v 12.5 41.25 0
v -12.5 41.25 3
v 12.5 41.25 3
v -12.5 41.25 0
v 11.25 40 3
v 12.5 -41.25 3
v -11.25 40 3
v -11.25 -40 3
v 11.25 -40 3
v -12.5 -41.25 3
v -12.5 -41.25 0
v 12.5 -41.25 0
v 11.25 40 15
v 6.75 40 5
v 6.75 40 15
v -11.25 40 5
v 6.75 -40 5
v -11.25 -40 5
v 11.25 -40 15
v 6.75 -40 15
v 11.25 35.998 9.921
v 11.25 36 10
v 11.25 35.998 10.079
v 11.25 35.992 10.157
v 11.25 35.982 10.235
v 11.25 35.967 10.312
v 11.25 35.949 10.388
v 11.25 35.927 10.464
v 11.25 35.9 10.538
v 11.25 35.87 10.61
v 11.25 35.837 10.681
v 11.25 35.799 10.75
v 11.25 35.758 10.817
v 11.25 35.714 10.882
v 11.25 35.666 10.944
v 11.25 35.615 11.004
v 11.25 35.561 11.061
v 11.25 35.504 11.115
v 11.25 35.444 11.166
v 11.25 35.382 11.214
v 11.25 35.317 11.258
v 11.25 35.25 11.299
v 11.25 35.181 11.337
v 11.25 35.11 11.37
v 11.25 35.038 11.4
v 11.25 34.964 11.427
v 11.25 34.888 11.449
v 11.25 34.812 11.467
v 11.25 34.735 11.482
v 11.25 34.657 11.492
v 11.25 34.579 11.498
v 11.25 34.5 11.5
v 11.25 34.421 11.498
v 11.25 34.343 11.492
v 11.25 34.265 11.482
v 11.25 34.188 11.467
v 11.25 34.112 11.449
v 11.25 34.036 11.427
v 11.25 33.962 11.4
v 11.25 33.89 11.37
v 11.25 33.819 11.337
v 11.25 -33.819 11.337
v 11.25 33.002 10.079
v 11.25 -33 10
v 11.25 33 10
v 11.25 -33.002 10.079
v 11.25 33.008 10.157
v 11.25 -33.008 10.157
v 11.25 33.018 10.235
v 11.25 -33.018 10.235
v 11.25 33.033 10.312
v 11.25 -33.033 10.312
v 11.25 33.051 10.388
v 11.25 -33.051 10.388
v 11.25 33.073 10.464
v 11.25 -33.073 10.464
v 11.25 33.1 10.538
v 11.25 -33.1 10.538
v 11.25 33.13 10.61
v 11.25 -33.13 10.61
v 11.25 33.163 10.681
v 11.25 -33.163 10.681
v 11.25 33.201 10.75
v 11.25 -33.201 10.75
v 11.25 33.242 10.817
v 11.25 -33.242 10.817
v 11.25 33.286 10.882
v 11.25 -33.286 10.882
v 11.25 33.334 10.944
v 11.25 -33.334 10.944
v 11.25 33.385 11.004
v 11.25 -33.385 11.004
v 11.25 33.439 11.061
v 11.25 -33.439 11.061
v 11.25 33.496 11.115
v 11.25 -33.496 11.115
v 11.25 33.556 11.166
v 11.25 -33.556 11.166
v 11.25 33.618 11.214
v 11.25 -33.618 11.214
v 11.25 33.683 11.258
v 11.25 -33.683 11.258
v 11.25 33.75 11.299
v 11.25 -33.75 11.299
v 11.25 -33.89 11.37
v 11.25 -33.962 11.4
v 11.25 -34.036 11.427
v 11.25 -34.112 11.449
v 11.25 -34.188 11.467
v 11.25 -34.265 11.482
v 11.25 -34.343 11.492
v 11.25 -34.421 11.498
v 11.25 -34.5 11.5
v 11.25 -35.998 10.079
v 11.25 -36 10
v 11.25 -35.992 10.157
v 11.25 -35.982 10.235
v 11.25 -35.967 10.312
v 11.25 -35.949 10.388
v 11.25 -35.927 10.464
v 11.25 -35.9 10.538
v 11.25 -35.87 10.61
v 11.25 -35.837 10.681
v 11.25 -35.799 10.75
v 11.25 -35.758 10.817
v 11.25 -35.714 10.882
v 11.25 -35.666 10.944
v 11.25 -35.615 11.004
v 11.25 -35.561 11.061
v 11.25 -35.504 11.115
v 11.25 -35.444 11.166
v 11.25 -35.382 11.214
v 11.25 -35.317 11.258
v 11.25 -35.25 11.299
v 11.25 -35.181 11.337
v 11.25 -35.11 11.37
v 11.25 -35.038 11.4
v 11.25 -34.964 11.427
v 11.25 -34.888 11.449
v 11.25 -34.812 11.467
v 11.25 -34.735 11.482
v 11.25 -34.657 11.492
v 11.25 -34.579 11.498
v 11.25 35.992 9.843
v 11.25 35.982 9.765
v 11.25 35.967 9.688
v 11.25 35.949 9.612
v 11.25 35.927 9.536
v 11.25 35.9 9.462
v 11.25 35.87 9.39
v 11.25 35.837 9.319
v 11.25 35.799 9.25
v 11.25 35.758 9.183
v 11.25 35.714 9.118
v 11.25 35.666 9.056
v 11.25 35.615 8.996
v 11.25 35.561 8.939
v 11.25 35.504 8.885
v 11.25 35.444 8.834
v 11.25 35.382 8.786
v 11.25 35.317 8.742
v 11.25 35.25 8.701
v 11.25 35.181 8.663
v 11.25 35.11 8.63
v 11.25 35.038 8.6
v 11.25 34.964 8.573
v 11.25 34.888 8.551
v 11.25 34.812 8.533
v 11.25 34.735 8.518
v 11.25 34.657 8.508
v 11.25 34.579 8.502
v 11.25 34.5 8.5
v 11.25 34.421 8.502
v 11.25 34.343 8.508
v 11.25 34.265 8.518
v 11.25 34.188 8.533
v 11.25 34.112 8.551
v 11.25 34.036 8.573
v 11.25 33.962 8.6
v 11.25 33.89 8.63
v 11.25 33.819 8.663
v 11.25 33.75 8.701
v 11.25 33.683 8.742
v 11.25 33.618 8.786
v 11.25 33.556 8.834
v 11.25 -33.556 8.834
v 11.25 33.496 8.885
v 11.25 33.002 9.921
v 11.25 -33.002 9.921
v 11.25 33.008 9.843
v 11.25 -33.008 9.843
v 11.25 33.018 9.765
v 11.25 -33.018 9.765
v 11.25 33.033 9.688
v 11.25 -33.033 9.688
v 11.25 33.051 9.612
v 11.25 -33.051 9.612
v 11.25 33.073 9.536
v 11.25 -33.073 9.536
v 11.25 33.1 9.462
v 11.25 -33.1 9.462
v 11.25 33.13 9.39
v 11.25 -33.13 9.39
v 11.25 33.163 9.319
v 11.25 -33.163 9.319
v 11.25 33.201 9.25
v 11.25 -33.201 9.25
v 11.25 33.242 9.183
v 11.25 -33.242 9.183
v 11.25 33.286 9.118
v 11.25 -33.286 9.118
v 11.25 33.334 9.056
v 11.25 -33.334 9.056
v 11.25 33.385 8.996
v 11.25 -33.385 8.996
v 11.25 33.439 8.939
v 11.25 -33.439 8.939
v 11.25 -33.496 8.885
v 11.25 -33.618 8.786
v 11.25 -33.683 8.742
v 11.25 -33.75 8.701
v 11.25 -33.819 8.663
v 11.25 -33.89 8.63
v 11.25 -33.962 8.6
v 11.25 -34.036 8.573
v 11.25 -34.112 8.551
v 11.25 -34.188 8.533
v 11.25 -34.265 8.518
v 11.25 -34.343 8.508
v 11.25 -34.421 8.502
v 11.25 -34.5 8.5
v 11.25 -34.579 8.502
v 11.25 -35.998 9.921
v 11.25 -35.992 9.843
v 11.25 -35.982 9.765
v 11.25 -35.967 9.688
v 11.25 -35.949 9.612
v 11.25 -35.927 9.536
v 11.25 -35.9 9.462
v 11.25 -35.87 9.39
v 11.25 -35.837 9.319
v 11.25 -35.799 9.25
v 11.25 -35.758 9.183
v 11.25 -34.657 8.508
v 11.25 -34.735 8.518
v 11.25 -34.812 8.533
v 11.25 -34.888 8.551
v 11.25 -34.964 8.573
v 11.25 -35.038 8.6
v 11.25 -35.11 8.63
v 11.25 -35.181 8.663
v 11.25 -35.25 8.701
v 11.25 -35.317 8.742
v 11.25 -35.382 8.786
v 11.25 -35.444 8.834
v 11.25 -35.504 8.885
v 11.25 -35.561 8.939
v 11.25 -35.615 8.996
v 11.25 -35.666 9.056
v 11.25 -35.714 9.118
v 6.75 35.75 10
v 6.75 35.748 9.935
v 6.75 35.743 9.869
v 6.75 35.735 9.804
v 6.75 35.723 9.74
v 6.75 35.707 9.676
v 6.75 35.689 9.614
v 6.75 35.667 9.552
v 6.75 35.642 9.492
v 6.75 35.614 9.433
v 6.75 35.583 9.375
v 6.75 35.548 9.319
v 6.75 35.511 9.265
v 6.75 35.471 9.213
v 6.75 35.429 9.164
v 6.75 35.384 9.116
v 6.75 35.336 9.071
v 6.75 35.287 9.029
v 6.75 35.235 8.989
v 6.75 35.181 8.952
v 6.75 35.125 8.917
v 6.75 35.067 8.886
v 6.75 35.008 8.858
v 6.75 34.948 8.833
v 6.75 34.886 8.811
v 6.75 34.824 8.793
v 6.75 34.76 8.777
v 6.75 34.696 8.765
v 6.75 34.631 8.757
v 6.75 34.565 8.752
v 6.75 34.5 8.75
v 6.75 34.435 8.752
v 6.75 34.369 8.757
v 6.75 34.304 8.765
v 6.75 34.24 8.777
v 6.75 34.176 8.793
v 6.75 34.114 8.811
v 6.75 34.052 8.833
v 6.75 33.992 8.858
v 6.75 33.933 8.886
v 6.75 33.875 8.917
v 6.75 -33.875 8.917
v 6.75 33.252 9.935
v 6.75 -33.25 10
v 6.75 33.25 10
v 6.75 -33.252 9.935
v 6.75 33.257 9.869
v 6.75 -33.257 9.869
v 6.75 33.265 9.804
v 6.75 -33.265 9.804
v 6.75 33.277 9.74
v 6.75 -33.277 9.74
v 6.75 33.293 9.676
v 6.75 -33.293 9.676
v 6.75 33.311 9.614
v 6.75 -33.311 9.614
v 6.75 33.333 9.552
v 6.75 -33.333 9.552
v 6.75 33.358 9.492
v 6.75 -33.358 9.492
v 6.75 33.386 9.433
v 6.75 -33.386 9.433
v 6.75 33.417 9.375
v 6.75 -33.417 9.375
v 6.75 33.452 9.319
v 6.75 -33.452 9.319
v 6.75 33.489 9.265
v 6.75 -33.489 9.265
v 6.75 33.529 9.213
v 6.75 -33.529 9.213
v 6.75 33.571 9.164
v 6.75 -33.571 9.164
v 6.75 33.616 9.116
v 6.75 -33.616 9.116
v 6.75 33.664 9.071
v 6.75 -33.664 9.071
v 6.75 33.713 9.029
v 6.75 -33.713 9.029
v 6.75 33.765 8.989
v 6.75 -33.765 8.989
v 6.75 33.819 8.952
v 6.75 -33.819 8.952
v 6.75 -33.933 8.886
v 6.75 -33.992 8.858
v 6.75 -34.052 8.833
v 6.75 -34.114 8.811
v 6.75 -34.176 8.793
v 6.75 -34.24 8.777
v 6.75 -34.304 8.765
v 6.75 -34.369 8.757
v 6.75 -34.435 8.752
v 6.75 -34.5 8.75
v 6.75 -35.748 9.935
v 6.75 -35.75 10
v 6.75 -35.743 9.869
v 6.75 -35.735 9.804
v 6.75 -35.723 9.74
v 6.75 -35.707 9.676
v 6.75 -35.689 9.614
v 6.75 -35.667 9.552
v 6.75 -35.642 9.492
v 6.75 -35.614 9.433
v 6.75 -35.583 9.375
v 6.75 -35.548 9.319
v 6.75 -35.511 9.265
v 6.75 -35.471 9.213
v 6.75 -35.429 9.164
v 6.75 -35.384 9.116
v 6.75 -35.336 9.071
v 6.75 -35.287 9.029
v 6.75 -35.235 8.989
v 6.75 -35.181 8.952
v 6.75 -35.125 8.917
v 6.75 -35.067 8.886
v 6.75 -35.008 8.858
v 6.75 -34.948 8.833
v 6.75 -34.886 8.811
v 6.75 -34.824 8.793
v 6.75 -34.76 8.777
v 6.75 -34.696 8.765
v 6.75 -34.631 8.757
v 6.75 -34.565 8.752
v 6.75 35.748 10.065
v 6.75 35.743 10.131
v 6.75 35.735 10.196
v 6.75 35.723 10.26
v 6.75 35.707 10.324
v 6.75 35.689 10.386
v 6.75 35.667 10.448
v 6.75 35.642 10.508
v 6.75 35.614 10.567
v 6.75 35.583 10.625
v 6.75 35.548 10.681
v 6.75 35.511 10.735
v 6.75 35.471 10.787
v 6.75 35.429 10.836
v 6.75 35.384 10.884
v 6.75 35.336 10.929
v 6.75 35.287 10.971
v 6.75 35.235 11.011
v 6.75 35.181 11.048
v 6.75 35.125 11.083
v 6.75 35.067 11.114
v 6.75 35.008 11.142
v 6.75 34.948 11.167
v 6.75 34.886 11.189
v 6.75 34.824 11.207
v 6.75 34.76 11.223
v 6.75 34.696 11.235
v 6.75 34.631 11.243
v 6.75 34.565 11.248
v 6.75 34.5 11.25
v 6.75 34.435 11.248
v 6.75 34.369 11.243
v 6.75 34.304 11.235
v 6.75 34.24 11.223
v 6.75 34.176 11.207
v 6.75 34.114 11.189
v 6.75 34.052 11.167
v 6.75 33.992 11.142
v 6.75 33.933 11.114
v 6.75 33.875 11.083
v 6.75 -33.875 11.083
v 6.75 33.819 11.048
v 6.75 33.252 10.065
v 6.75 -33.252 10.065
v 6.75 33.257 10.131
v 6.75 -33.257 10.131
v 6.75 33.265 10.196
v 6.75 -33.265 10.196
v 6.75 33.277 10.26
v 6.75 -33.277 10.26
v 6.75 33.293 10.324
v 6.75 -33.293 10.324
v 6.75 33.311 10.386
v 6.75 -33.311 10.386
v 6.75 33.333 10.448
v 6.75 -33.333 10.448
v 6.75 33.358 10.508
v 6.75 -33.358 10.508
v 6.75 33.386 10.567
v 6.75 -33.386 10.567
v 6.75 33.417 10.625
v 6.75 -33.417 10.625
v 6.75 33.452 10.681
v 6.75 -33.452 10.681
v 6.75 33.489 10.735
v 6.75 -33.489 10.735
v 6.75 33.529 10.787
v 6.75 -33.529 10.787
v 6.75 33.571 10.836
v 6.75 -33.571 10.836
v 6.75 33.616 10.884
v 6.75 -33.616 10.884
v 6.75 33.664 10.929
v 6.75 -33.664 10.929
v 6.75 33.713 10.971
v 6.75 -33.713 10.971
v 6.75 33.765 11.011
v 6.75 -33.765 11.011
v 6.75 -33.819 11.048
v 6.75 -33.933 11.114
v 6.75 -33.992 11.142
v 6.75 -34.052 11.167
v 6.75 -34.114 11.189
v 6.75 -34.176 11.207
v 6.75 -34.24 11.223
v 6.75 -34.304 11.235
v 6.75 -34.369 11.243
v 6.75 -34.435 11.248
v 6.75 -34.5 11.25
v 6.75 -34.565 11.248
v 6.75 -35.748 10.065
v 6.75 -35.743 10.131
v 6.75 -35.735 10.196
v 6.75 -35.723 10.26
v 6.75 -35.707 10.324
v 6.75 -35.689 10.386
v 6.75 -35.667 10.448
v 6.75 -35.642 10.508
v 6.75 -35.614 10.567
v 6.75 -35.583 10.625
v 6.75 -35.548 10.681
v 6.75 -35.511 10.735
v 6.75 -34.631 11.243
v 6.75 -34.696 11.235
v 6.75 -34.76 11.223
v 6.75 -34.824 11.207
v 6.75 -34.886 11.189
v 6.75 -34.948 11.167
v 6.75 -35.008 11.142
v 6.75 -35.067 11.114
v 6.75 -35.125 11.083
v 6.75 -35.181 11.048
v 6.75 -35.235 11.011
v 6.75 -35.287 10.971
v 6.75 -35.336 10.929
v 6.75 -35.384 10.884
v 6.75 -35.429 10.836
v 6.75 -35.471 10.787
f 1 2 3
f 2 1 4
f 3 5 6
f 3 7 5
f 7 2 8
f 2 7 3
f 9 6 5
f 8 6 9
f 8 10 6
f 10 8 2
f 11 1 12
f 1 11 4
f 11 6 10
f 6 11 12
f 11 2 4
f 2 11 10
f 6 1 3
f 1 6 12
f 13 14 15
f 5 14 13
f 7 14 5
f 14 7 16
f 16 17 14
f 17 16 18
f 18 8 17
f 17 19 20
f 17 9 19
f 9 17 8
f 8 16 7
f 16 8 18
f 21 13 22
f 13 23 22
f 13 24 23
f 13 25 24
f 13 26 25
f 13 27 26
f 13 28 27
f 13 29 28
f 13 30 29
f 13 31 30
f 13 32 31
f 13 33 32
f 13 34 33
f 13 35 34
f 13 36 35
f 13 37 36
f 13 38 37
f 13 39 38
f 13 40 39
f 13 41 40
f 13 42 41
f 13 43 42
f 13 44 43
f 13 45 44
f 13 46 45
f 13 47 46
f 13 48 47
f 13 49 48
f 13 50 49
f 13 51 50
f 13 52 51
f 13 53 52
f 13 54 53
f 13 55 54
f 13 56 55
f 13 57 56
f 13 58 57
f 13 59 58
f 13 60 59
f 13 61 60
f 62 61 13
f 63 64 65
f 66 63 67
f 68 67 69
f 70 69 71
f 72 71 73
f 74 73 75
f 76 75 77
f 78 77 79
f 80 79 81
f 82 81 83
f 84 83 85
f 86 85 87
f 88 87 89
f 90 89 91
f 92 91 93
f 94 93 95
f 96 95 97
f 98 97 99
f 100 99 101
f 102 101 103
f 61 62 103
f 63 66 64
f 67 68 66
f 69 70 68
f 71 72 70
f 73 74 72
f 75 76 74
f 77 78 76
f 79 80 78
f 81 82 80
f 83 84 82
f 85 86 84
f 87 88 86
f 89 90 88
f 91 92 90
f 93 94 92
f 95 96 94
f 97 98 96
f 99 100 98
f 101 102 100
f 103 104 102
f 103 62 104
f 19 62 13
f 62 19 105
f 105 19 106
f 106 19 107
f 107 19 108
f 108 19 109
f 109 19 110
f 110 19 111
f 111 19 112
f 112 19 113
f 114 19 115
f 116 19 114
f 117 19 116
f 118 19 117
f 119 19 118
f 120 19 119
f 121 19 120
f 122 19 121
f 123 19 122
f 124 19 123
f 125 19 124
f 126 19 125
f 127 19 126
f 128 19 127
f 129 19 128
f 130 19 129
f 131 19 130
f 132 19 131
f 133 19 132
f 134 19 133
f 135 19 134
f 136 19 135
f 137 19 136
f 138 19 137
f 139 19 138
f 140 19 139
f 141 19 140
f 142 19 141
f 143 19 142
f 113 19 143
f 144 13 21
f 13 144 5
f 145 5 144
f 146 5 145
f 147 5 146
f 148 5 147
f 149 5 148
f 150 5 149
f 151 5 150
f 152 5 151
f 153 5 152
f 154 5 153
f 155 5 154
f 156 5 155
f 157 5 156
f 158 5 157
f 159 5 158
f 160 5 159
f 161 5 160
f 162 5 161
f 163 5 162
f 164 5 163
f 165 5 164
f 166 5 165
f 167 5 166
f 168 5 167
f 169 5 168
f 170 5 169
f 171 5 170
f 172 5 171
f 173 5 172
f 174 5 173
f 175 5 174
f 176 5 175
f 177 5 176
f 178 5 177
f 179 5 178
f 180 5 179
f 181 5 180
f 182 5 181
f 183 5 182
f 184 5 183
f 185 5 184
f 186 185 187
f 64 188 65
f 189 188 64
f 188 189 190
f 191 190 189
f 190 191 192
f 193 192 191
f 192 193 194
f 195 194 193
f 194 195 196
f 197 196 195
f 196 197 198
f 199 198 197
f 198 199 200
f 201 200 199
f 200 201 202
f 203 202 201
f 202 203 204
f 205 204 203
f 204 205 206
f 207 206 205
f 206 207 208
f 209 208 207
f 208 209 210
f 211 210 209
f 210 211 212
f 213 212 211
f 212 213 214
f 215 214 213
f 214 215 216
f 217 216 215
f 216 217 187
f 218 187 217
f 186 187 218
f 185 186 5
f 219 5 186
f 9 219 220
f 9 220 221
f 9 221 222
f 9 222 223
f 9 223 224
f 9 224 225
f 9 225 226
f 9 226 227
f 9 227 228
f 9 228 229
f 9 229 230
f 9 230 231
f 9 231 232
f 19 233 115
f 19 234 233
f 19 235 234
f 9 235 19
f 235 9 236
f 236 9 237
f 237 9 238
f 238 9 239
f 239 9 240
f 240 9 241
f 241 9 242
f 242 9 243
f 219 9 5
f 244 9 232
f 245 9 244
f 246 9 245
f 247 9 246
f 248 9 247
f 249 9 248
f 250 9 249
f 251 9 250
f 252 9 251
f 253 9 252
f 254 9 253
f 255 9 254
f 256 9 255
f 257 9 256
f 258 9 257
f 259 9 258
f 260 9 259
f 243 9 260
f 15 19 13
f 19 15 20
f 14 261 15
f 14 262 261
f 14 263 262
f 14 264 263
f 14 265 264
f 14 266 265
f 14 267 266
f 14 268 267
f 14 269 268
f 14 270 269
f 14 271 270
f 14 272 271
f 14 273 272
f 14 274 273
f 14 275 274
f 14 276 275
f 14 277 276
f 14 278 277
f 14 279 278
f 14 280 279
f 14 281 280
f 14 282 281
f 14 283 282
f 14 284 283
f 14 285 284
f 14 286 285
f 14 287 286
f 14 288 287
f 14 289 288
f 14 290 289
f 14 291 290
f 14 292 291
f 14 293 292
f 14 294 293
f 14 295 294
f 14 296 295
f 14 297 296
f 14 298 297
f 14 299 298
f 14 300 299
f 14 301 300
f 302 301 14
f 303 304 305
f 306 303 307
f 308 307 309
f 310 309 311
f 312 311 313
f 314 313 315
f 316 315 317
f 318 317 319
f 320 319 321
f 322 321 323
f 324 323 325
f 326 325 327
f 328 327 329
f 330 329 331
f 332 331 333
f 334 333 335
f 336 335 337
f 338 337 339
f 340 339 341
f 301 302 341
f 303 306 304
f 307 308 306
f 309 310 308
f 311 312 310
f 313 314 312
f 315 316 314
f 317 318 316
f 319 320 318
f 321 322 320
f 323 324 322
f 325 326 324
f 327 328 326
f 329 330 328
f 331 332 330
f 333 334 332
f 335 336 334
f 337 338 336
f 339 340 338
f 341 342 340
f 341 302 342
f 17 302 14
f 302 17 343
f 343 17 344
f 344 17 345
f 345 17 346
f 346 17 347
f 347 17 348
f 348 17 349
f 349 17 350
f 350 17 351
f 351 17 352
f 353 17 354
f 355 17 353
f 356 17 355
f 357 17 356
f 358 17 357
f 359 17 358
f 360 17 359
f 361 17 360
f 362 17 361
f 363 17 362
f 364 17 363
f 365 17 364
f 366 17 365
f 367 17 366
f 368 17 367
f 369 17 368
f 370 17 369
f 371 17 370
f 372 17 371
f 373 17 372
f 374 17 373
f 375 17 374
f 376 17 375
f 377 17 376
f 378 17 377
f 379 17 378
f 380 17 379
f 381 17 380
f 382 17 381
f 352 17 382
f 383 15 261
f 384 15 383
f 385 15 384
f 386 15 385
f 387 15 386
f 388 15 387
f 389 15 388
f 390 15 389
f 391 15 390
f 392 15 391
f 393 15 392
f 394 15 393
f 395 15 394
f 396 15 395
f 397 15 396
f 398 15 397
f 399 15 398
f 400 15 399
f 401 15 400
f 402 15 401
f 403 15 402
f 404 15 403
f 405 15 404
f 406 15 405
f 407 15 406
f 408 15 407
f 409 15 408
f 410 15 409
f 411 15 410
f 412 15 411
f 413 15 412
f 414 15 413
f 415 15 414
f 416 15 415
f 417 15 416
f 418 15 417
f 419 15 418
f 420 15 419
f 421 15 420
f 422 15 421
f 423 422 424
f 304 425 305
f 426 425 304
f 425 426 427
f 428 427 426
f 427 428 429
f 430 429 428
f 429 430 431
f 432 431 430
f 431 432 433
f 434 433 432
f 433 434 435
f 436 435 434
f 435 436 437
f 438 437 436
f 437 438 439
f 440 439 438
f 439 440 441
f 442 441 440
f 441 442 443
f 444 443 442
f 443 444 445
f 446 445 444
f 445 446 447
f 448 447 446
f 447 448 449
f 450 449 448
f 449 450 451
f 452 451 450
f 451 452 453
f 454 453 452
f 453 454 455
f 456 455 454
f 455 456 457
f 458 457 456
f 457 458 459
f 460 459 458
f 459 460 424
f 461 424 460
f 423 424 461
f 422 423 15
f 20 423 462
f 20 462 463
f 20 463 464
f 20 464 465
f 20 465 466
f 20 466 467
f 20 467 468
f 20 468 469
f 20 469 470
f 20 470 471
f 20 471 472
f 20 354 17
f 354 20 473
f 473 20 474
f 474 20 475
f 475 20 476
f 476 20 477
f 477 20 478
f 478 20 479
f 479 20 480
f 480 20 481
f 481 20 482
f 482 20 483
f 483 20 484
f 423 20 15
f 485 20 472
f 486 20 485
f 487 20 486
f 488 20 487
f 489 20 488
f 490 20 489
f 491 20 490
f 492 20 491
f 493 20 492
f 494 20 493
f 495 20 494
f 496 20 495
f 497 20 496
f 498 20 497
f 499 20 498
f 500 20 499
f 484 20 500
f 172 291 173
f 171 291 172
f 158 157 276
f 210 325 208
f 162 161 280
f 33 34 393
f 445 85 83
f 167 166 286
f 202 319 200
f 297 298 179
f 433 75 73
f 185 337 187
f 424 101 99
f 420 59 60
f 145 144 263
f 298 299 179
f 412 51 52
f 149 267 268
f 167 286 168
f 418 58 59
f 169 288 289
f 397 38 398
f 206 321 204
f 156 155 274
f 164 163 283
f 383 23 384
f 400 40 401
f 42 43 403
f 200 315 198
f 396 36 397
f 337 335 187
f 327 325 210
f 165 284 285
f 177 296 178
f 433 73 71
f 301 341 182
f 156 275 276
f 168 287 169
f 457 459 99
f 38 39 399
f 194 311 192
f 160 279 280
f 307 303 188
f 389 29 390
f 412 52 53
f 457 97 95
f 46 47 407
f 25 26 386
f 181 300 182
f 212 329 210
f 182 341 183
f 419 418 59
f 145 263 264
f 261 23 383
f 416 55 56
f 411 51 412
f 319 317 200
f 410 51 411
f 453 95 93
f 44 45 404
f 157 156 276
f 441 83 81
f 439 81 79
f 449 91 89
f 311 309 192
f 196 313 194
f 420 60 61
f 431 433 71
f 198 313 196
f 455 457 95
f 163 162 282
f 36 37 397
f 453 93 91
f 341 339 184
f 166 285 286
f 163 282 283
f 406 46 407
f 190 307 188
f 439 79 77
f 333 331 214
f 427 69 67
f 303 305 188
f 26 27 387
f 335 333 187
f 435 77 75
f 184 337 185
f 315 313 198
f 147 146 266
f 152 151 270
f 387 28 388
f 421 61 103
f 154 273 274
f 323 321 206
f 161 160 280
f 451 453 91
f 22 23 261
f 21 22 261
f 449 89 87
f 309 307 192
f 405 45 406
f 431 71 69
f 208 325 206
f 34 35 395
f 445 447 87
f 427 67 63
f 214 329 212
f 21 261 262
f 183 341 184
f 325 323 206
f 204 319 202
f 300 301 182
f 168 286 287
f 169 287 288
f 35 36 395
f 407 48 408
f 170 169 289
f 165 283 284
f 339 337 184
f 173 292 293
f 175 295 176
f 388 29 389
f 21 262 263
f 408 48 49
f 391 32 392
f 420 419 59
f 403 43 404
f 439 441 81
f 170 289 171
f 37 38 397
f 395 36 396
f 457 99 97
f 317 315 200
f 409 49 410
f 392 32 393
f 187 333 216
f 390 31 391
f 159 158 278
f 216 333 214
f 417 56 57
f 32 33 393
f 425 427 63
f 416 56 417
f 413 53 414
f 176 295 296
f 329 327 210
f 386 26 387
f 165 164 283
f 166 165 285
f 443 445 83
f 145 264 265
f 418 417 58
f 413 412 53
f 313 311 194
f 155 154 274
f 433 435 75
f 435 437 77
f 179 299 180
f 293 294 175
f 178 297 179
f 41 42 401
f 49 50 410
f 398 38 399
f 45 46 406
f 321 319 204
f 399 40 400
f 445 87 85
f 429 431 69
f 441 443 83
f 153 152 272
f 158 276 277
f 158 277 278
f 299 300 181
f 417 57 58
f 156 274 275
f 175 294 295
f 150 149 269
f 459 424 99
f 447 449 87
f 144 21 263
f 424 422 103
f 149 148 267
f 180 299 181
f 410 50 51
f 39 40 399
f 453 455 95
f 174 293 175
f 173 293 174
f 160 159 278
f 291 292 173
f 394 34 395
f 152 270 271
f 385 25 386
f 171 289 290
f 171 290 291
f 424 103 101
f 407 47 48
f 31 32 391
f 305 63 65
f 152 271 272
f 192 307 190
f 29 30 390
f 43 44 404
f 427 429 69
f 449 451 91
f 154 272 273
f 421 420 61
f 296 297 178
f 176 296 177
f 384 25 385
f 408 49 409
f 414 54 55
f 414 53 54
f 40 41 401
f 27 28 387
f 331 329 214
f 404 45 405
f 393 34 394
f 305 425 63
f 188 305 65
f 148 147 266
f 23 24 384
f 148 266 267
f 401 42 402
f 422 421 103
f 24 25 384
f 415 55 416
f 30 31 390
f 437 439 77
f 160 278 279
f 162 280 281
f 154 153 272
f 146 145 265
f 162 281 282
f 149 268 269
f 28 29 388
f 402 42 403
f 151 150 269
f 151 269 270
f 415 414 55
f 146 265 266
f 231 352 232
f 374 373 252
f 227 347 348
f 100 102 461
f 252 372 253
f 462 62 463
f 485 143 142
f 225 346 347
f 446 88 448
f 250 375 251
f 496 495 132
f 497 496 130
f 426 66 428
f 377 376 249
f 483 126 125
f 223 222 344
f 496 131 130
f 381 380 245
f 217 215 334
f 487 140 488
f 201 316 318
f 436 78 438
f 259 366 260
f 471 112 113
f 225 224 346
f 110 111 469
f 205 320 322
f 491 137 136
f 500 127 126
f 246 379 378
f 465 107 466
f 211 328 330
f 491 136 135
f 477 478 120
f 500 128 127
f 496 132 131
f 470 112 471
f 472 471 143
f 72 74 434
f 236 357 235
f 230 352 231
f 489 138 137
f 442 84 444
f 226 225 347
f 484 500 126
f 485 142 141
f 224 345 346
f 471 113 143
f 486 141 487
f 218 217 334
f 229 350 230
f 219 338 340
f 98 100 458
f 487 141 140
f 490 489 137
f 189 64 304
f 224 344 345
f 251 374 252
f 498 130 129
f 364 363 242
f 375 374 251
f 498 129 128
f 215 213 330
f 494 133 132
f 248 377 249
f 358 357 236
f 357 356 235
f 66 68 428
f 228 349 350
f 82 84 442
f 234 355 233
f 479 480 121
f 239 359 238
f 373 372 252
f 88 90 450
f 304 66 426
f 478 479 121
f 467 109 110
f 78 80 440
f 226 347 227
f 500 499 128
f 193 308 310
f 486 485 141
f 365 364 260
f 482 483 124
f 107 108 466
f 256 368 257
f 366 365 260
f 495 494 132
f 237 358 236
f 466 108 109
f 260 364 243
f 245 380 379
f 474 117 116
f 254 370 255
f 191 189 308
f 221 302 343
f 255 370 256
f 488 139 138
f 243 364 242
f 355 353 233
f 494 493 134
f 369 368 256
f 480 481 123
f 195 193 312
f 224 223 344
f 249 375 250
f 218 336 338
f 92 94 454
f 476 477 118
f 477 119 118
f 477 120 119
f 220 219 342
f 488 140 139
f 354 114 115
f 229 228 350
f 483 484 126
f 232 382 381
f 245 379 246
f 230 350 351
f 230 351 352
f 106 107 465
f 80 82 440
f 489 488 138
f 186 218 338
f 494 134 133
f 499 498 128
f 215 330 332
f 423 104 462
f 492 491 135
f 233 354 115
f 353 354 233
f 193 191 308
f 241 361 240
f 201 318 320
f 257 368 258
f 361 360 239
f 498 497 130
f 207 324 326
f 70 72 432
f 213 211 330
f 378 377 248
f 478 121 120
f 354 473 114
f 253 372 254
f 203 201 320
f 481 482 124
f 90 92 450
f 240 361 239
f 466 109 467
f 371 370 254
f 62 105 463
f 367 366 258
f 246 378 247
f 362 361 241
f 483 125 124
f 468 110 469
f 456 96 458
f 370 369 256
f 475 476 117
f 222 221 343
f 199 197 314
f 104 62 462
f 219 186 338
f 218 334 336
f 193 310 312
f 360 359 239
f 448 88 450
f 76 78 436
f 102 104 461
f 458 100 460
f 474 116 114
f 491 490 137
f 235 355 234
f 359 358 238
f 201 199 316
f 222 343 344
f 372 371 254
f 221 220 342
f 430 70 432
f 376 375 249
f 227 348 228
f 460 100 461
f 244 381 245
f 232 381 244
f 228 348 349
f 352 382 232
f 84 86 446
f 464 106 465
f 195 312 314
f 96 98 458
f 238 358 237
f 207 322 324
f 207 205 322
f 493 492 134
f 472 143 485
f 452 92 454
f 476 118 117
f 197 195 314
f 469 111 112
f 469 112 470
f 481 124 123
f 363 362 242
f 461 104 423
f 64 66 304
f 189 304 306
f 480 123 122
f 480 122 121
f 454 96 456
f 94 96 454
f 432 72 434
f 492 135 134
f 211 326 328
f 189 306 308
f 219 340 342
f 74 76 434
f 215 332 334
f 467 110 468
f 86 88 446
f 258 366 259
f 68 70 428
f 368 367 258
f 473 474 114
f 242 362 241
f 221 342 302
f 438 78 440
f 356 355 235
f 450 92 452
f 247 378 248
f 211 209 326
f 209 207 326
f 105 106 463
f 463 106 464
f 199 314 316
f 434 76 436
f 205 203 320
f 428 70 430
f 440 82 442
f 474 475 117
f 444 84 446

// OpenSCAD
include <hal9000.scad>

conf_rfid = false;
conf_rotary = false;
conf_button = false;

rotate([+00.0,+00.0,+90.0]) hal9000_enclosure_panel();
